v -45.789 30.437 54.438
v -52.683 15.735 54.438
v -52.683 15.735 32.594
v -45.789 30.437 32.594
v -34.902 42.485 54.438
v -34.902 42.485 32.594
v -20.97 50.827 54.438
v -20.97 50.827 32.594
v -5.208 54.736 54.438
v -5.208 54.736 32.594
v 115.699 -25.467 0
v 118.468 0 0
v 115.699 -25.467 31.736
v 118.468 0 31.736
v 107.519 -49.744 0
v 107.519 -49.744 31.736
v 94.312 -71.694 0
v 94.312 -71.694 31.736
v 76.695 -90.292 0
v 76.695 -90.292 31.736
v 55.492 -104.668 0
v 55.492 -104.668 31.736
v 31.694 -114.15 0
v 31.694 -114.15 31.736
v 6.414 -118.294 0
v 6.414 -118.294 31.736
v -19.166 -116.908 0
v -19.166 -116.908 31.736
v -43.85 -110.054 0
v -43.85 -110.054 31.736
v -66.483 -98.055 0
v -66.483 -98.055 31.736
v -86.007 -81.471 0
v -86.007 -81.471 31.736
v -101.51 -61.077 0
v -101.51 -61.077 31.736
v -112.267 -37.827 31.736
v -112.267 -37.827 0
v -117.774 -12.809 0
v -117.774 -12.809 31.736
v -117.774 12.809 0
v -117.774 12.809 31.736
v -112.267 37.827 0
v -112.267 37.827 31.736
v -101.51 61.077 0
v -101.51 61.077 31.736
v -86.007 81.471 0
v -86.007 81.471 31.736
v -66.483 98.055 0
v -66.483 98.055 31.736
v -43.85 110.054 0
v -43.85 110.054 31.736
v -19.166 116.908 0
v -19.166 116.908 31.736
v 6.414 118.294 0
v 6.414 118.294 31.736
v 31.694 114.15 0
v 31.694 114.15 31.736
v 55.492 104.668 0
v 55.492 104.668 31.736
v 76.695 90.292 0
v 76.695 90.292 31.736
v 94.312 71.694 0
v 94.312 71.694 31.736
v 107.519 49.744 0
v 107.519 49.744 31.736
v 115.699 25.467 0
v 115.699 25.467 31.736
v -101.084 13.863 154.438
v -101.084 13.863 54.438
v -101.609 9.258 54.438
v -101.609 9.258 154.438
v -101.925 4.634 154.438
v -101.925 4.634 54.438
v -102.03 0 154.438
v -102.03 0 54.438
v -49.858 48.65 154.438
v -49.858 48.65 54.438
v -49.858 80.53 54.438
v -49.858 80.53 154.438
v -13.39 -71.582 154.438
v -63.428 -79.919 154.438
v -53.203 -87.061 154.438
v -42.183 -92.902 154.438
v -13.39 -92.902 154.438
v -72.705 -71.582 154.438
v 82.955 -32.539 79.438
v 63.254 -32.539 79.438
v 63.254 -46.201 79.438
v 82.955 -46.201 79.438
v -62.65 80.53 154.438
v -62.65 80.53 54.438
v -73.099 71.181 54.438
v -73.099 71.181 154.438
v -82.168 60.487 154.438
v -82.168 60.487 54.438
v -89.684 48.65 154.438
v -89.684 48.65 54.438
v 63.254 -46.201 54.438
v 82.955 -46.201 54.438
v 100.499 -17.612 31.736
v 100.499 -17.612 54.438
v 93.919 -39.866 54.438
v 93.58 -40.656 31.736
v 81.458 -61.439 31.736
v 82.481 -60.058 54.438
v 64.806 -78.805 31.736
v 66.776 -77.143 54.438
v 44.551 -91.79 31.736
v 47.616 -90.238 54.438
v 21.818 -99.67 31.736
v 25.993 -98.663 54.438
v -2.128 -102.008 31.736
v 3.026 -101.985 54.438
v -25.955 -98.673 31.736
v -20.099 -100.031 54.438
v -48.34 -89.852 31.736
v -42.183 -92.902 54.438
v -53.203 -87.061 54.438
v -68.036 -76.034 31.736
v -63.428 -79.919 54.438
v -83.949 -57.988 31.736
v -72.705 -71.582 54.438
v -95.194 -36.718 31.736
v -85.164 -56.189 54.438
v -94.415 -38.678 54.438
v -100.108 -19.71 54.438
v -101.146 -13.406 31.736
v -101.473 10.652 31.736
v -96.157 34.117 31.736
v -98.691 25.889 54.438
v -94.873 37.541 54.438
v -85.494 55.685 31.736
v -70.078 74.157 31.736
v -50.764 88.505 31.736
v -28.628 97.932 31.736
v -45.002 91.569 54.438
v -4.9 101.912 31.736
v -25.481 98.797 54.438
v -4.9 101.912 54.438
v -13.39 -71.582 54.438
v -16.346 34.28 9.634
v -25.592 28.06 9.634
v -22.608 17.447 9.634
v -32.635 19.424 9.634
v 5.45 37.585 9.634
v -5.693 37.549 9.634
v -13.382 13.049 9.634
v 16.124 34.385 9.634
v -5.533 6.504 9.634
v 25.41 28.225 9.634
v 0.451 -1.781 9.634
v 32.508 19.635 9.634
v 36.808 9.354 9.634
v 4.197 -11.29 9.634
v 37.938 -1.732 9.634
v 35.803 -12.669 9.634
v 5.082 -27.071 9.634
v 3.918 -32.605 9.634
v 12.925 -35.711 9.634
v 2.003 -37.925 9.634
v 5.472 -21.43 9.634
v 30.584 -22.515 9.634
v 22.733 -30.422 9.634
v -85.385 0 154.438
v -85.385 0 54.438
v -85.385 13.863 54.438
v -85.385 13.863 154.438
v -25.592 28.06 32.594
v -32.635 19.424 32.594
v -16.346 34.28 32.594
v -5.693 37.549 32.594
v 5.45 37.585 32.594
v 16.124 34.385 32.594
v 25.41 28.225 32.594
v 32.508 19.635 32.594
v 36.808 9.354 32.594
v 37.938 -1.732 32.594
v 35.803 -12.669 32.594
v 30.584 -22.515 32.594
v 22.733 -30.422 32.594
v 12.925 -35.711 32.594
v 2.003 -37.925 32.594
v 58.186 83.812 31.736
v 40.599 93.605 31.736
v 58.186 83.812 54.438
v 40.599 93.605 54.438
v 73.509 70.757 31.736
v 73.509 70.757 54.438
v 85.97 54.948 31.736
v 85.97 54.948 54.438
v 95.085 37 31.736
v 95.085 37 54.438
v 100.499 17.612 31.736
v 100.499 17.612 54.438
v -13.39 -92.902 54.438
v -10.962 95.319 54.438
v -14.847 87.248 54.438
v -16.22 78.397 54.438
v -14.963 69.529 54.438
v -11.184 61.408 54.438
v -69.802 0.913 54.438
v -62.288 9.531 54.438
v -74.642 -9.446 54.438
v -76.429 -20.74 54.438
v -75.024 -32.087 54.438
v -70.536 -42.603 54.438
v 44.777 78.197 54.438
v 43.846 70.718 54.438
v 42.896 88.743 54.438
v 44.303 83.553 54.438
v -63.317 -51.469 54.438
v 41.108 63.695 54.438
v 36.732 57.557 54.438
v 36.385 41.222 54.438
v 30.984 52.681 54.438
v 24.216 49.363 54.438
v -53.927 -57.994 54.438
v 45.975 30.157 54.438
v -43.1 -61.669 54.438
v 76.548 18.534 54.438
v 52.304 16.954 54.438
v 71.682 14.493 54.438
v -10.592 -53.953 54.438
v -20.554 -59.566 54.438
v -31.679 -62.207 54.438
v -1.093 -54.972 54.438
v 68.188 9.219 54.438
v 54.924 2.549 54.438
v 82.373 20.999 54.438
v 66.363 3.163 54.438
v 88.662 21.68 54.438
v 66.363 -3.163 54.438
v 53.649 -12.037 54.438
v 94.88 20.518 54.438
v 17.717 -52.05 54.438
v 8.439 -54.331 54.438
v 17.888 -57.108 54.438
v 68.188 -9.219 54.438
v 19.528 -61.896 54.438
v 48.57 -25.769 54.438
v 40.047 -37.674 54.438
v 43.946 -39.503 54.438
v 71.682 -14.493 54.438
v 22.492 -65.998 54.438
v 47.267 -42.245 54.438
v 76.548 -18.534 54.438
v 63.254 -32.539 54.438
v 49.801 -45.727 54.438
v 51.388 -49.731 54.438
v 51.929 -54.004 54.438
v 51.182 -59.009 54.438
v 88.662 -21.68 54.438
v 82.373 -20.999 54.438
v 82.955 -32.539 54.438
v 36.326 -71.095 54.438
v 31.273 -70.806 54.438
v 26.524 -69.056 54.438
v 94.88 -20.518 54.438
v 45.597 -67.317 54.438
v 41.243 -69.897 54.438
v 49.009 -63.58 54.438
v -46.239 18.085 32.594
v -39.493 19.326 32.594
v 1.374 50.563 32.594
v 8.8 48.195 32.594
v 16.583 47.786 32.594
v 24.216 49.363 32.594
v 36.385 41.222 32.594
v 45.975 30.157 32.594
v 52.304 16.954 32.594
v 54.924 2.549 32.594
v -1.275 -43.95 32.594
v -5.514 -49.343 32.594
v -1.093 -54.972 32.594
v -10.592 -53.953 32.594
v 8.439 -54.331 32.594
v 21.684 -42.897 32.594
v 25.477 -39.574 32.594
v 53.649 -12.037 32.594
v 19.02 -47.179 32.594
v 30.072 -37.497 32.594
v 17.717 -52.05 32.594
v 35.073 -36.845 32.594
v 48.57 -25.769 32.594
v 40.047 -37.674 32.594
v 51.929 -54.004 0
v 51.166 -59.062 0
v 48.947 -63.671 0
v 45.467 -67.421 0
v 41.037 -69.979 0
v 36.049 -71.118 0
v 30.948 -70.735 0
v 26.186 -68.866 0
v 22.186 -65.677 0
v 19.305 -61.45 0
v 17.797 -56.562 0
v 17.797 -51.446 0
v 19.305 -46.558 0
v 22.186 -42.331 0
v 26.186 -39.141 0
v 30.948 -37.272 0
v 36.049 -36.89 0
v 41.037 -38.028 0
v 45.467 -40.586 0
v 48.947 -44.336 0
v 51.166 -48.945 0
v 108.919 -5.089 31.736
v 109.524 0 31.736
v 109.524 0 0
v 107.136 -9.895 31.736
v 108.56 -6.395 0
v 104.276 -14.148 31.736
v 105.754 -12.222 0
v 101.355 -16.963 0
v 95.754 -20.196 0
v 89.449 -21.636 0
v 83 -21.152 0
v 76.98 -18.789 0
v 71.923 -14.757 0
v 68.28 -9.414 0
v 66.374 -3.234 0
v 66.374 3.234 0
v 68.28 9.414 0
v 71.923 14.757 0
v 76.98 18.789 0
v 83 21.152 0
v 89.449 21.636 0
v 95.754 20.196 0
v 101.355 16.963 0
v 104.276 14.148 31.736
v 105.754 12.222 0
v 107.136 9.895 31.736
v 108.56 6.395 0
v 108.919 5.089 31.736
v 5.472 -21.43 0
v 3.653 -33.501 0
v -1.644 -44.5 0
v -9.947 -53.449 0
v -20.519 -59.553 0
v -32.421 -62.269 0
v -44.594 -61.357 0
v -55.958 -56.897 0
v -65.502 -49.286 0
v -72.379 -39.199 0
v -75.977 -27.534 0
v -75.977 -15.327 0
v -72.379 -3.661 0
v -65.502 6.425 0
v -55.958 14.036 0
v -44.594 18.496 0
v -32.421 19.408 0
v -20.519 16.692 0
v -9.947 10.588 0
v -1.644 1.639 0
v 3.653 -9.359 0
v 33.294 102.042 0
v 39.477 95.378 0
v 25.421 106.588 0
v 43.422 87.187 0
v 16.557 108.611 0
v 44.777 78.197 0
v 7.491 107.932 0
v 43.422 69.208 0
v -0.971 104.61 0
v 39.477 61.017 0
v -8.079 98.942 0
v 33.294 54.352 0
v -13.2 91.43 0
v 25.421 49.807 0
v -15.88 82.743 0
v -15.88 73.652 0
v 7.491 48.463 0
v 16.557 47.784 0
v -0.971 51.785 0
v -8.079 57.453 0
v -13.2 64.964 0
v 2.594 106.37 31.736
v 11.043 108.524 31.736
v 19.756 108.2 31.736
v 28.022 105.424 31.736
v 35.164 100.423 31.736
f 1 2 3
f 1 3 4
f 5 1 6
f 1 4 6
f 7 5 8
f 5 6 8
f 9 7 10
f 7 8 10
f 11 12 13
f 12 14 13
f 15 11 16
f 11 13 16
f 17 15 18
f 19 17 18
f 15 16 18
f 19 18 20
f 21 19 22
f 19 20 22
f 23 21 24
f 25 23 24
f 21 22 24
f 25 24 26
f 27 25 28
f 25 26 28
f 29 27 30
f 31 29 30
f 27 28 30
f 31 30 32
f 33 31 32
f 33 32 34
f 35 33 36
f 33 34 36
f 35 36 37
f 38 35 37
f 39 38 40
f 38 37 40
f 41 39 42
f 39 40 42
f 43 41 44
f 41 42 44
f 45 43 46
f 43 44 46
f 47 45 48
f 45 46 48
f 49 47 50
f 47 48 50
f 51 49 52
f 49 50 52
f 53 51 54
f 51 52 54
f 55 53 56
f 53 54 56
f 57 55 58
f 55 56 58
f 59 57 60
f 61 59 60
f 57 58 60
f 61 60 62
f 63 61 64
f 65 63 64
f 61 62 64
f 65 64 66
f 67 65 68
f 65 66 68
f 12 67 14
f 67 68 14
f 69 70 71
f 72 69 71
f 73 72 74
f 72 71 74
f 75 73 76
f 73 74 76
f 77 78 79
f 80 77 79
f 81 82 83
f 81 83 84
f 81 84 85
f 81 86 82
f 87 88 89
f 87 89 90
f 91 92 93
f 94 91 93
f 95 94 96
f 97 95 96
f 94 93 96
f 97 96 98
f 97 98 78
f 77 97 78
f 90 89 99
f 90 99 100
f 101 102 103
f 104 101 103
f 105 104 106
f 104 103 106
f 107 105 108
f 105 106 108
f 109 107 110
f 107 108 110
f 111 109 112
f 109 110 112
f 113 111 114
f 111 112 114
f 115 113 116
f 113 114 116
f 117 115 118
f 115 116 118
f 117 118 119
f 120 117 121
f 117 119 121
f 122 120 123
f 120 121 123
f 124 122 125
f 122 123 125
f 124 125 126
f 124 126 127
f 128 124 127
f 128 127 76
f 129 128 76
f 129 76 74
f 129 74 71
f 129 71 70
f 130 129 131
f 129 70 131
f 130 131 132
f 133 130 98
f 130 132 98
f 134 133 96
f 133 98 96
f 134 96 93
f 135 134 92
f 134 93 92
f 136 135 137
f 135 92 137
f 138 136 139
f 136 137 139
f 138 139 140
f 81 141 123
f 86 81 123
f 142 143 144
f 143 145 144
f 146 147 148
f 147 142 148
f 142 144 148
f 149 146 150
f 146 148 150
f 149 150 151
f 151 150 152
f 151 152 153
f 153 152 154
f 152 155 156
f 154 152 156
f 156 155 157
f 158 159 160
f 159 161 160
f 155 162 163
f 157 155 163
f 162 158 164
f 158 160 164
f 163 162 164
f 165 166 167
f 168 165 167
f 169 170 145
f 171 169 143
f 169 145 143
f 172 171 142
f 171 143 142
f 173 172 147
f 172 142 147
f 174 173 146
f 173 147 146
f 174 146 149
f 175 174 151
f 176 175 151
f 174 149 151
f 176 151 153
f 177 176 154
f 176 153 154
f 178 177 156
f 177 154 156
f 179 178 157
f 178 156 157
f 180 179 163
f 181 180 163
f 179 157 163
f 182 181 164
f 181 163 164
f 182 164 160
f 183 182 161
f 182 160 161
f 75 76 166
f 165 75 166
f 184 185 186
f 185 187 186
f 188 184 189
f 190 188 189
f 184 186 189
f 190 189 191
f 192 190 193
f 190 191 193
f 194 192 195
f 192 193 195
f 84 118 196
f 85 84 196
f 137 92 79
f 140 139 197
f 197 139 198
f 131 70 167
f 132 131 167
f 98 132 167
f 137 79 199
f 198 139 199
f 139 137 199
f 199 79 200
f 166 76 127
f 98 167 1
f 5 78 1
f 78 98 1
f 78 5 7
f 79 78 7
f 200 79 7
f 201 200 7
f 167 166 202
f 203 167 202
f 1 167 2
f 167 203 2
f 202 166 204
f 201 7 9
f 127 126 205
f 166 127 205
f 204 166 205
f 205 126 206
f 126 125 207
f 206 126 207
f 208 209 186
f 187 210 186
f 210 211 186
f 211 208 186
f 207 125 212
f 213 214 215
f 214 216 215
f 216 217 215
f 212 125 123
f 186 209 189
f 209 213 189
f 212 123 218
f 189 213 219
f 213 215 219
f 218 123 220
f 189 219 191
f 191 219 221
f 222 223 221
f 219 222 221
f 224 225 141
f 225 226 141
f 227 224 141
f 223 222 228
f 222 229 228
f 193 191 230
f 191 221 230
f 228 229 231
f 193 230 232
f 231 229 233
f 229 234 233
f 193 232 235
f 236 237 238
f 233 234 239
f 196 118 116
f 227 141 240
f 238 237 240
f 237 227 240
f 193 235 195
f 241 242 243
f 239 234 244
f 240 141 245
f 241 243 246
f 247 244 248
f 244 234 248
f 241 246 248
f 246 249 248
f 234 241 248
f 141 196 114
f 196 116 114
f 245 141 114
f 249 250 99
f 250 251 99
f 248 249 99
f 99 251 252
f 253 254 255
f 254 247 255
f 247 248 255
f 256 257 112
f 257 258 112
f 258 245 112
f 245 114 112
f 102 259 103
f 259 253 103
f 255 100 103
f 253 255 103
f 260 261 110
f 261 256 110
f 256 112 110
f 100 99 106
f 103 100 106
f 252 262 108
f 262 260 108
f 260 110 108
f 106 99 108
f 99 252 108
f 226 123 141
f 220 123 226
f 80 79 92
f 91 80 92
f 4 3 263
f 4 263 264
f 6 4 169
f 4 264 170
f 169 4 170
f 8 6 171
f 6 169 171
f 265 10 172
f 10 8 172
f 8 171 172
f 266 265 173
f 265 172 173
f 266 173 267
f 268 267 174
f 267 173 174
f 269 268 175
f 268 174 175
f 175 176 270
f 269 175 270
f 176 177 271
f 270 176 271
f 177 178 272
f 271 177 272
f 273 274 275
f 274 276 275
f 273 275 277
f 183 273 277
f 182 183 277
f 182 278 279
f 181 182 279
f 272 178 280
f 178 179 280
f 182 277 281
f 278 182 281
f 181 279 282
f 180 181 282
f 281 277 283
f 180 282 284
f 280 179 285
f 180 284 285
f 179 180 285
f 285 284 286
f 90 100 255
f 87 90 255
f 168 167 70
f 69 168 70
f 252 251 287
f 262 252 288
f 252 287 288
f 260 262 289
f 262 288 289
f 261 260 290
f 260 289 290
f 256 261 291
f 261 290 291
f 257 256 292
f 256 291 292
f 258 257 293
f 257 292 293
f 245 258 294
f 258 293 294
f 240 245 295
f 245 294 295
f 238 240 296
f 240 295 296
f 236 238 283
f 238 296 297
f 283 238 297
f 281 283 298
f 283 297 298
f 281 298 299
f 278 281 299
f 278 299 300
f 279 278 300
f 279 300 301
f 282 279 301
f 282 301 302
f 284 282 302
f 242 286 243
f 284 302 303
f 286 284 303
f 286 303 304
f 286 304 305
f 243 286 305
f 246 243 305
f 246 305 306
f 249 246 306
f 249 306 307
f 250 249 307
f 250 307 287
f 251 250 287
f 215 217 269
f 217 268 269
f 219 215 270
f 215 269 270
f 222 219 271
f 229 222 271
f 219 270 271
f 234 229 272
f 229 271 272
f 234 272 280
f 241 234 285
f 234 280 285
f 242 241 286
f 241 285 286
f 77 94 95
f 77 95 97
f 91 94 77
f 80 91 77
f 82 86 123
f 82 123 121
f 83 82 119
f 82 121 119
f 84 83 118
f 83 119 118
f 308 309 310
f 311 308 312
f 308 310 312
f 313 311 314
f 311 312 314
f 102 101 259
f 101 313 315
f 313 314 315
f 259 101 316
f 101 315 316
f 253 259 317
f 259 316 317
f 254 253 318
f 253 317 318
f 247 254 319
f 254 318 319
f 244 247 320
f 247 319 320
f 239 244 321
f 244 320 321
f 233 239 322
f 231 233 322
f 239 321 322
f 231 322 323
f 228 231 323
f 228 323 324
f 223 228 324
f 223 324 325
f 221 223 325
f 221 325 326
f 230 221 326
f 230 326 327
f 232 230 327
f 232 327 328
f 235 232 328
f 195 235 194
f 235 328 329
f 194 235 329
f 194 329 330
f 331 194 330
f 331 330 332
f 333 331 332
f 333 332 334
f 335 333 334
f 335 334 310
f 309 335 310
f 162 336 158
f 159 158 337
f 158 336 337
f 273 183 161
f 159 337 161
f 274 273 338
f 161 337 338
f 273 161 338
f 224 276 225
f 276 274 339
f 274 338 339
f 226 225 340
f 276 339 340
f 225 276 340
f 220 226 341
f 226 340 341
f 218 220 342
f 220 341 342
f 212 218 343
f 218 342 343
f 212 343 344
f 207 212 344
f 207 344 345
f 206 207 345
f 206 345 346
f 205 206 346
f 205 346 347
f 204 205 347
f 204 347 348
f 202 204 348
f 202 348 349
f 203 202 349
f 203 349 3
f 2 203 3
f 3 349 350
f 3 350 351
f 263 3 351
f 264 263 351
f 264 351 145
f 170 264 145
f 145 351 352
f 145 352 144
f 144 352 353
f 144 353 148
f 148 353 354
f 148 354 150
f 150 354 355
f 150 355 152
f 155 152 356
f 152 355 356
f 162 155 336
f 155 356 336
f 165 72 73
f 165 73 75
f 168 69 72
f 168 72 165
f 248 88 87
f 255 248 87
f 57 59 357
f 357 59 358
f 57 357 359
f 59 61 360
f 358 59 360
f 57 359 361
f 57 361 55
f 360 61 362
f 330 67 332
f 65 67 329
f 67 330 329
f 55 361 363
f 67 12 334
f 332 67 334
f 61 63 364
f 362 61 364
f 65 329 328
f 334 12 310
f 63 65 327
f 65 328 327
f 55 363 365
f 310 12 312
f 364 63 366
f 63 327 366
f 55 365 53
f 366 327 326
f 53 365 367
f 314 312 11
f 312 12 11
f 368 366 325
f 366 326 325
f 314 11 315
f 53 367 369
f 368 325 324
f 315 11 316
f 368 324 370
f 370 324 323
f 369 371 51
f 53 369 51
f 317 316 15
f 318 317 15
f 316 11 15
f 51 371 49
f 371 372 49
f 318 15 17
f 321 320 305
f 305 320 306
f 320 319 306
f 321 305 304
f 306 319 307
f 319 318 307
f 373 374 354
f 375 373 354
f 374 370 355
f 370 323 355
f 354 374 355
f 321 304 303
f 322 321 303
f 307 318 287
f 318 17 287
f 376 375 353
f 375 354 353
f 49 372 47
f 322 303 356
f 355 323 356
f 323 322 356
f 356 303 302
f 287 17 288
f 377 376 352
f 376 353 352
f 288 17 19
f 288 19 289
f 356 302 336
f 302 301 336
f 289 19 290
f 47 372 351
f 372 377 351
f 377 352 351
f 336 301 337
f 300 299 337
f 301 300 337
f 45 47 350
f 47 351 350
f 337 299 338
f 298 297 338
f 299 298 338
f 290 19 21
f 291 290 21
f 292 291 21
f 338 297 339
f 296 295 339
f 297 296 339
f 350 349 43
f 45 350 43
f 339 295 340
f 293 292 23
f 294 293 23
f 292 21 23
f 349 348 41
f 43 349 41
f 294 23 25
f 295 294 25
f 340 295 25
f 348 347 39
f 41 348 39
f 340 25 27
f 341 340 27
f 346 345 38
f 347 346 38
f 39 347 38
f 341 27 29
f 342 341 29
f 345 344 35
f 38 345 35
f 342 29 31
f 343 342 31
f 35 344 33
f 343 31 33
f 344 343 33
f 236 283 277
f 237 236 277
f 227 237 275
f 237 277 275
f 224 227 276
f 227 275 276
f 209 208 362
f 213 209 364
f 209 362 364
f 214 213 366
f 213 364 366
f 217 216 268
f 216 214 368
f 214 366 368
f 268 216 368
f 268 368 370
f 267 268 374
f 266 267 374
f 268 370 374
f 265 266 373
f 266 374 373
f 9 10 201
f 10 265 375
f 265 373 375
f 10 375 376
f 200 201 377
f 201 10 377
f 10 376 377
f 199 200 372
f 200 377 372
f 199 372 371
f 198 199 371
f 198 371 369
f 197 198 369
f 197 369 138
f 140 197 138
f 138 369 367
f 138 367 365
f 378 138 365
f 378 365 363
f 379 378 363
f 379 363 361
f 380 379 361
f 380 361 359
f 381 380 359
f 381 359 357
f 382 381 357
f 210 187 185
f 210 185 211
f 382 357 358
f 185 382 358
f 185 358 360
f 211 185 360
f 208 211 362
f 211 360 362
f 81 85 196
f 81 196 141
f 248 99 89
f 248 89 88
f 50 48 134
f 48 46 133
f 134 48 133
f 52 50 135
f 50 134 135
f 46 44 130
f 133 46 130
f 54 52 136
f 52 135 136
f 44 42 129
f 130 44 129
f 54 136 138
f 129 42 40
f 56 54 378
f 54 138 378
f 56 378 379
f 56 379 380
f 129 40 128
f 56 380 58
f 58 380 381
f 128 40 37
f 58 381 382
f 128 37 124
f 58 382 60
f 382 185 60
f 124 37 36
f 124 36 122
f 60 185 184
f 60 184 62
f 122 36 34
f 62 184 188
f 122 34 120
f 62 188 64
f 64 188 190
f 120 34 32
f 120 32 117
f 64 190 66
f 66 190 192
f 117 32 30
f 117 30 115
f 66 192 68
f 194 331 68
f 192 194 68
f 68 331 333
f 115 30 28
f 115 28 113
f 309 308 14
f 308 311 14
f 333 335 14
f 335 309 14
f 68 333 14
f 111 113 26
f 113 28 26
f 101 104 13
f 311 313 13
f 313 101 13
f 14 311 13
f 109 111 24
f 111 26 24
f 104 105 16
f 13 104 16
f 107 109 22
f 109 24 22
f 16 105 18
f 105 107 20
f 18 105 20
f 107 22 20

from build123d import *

# Parameters (mm, degrees)
F2_R     = 21.6962130455
F2_R_2   = 17.1617704493
F2_R_3   = 40.953196501
F2_R_4   = 30.4988959279
F3_DEPTH = 1000
F5_DEPTH = 100
F6_W     = 19.7006091475
F6_H     = 13.662148267
F7_DEPTH = 25


# Not quite as in the source:
# - after a boolean that leaves OpenCascade's solid faulty, fix() repairs it


with BuildPart() as f1:
    # F0 (on Front) → F1 (revolve)
    with BuildSketch(Plane.XZ):
        Polygon((0, 9.6338680014), (0, 0), (118.4682399035, 0), (118.4682399035, 31.7357704043), (102.0300611854, 31.7357704043), (102.0300611854, 54.4380694628), (54.9828708172, 54.4380694628), (54.9828708172, 32.5937792659), (37.9778593779, 32.5937792659), (37.9778593779, 9.6338680014), align=None)
    revolve(axis=Axis((0, 0, 4.8169340007), (0, 0, -1)))

    # F2 (on face) → F3 (cut)
    with BuildSketch(Plane(origin=(0, 0, 0), x_dir=(1, 0, 0), z_dir=(0, 0, -1))):
        with Locations((87.8278240561, 0)):
            Circle(F2_R)
        with Locations((34.7668491304, 54.0037713945)):
            Circle(F2_R_2)
        with Locations((-35.4811474681, 21.4303005487)):
            Circle(F2_R_3)
        with Locations((14.2781008035, -78.1974196434)):
            Circle(F2_R_4)
    extrude(amount=-F3_DEPTH, mode=Mode.SUBTRACT)

    # F4 (on face) → F5 (join)
    with BuildSketch(Plane.XY.offset(54.4380694628)):
        with BuildLine():
            Line((-49.8583316803, 48.6504090547), (-49.8583316803, 80.5302113295))
            Line((-49.8583316803, 80.5302113295), (-62.6499676674, 80.5302113295))
            ThreePointArc((-62.6499676674, 80.5302113295), (-77.8171679529, 65.9895579412), (-89.684285604, 48.6504090547))
            Line((-89.684285604, 48.6504090547), (-49.8583316803, 48.6504090547))
        make_face()
        with BuildLine():
            Line((-85.3846818209, 13.8626152044), (-101.0839318843, 13.8626152044))
            ThreePointArc((-101.0839318843, 13.8626152044), (-101.7932540508, 6.9474322767), (-102.0300611854, 0))
            Line((-102.0300611854, 0), (-85.3846818209, 0))
            Line((-85.3846818209, 0), (-85.3846818209, 13.8626152044))
        make_face()
        with BuildLine():
            Line((-13.3902756497, -71.5824663639), (-72.7054598689, -71.5824663639))
            ThreePointArc((-72.7054598689, -71.5824663639), (-58.4249180154, -83.6460539439), (-42.1830749936, -92.9016768932))
            Line((-42.1830749936, -92.9016768932), (-13.3902756497, -92.9016768932))
            Line((-13.3902756497, -92.9016768932), (-13.3902756497, -71.5824663639))
        make_face()
    extrude(amount=F5_DEPTH)

    add(f1.part.fix(), mode=Mode.REPLACE)

    # F6 (on face) → F7 (join)
    with BuildSketch(Plane.XY.offset(54.4380694628)):
        with Locations((73.1044746935, -39.3697526306)):
            Rectangle(F6_W, F6_H)
    extrude(amount=F7_DEPTH)


solid = f1.part
